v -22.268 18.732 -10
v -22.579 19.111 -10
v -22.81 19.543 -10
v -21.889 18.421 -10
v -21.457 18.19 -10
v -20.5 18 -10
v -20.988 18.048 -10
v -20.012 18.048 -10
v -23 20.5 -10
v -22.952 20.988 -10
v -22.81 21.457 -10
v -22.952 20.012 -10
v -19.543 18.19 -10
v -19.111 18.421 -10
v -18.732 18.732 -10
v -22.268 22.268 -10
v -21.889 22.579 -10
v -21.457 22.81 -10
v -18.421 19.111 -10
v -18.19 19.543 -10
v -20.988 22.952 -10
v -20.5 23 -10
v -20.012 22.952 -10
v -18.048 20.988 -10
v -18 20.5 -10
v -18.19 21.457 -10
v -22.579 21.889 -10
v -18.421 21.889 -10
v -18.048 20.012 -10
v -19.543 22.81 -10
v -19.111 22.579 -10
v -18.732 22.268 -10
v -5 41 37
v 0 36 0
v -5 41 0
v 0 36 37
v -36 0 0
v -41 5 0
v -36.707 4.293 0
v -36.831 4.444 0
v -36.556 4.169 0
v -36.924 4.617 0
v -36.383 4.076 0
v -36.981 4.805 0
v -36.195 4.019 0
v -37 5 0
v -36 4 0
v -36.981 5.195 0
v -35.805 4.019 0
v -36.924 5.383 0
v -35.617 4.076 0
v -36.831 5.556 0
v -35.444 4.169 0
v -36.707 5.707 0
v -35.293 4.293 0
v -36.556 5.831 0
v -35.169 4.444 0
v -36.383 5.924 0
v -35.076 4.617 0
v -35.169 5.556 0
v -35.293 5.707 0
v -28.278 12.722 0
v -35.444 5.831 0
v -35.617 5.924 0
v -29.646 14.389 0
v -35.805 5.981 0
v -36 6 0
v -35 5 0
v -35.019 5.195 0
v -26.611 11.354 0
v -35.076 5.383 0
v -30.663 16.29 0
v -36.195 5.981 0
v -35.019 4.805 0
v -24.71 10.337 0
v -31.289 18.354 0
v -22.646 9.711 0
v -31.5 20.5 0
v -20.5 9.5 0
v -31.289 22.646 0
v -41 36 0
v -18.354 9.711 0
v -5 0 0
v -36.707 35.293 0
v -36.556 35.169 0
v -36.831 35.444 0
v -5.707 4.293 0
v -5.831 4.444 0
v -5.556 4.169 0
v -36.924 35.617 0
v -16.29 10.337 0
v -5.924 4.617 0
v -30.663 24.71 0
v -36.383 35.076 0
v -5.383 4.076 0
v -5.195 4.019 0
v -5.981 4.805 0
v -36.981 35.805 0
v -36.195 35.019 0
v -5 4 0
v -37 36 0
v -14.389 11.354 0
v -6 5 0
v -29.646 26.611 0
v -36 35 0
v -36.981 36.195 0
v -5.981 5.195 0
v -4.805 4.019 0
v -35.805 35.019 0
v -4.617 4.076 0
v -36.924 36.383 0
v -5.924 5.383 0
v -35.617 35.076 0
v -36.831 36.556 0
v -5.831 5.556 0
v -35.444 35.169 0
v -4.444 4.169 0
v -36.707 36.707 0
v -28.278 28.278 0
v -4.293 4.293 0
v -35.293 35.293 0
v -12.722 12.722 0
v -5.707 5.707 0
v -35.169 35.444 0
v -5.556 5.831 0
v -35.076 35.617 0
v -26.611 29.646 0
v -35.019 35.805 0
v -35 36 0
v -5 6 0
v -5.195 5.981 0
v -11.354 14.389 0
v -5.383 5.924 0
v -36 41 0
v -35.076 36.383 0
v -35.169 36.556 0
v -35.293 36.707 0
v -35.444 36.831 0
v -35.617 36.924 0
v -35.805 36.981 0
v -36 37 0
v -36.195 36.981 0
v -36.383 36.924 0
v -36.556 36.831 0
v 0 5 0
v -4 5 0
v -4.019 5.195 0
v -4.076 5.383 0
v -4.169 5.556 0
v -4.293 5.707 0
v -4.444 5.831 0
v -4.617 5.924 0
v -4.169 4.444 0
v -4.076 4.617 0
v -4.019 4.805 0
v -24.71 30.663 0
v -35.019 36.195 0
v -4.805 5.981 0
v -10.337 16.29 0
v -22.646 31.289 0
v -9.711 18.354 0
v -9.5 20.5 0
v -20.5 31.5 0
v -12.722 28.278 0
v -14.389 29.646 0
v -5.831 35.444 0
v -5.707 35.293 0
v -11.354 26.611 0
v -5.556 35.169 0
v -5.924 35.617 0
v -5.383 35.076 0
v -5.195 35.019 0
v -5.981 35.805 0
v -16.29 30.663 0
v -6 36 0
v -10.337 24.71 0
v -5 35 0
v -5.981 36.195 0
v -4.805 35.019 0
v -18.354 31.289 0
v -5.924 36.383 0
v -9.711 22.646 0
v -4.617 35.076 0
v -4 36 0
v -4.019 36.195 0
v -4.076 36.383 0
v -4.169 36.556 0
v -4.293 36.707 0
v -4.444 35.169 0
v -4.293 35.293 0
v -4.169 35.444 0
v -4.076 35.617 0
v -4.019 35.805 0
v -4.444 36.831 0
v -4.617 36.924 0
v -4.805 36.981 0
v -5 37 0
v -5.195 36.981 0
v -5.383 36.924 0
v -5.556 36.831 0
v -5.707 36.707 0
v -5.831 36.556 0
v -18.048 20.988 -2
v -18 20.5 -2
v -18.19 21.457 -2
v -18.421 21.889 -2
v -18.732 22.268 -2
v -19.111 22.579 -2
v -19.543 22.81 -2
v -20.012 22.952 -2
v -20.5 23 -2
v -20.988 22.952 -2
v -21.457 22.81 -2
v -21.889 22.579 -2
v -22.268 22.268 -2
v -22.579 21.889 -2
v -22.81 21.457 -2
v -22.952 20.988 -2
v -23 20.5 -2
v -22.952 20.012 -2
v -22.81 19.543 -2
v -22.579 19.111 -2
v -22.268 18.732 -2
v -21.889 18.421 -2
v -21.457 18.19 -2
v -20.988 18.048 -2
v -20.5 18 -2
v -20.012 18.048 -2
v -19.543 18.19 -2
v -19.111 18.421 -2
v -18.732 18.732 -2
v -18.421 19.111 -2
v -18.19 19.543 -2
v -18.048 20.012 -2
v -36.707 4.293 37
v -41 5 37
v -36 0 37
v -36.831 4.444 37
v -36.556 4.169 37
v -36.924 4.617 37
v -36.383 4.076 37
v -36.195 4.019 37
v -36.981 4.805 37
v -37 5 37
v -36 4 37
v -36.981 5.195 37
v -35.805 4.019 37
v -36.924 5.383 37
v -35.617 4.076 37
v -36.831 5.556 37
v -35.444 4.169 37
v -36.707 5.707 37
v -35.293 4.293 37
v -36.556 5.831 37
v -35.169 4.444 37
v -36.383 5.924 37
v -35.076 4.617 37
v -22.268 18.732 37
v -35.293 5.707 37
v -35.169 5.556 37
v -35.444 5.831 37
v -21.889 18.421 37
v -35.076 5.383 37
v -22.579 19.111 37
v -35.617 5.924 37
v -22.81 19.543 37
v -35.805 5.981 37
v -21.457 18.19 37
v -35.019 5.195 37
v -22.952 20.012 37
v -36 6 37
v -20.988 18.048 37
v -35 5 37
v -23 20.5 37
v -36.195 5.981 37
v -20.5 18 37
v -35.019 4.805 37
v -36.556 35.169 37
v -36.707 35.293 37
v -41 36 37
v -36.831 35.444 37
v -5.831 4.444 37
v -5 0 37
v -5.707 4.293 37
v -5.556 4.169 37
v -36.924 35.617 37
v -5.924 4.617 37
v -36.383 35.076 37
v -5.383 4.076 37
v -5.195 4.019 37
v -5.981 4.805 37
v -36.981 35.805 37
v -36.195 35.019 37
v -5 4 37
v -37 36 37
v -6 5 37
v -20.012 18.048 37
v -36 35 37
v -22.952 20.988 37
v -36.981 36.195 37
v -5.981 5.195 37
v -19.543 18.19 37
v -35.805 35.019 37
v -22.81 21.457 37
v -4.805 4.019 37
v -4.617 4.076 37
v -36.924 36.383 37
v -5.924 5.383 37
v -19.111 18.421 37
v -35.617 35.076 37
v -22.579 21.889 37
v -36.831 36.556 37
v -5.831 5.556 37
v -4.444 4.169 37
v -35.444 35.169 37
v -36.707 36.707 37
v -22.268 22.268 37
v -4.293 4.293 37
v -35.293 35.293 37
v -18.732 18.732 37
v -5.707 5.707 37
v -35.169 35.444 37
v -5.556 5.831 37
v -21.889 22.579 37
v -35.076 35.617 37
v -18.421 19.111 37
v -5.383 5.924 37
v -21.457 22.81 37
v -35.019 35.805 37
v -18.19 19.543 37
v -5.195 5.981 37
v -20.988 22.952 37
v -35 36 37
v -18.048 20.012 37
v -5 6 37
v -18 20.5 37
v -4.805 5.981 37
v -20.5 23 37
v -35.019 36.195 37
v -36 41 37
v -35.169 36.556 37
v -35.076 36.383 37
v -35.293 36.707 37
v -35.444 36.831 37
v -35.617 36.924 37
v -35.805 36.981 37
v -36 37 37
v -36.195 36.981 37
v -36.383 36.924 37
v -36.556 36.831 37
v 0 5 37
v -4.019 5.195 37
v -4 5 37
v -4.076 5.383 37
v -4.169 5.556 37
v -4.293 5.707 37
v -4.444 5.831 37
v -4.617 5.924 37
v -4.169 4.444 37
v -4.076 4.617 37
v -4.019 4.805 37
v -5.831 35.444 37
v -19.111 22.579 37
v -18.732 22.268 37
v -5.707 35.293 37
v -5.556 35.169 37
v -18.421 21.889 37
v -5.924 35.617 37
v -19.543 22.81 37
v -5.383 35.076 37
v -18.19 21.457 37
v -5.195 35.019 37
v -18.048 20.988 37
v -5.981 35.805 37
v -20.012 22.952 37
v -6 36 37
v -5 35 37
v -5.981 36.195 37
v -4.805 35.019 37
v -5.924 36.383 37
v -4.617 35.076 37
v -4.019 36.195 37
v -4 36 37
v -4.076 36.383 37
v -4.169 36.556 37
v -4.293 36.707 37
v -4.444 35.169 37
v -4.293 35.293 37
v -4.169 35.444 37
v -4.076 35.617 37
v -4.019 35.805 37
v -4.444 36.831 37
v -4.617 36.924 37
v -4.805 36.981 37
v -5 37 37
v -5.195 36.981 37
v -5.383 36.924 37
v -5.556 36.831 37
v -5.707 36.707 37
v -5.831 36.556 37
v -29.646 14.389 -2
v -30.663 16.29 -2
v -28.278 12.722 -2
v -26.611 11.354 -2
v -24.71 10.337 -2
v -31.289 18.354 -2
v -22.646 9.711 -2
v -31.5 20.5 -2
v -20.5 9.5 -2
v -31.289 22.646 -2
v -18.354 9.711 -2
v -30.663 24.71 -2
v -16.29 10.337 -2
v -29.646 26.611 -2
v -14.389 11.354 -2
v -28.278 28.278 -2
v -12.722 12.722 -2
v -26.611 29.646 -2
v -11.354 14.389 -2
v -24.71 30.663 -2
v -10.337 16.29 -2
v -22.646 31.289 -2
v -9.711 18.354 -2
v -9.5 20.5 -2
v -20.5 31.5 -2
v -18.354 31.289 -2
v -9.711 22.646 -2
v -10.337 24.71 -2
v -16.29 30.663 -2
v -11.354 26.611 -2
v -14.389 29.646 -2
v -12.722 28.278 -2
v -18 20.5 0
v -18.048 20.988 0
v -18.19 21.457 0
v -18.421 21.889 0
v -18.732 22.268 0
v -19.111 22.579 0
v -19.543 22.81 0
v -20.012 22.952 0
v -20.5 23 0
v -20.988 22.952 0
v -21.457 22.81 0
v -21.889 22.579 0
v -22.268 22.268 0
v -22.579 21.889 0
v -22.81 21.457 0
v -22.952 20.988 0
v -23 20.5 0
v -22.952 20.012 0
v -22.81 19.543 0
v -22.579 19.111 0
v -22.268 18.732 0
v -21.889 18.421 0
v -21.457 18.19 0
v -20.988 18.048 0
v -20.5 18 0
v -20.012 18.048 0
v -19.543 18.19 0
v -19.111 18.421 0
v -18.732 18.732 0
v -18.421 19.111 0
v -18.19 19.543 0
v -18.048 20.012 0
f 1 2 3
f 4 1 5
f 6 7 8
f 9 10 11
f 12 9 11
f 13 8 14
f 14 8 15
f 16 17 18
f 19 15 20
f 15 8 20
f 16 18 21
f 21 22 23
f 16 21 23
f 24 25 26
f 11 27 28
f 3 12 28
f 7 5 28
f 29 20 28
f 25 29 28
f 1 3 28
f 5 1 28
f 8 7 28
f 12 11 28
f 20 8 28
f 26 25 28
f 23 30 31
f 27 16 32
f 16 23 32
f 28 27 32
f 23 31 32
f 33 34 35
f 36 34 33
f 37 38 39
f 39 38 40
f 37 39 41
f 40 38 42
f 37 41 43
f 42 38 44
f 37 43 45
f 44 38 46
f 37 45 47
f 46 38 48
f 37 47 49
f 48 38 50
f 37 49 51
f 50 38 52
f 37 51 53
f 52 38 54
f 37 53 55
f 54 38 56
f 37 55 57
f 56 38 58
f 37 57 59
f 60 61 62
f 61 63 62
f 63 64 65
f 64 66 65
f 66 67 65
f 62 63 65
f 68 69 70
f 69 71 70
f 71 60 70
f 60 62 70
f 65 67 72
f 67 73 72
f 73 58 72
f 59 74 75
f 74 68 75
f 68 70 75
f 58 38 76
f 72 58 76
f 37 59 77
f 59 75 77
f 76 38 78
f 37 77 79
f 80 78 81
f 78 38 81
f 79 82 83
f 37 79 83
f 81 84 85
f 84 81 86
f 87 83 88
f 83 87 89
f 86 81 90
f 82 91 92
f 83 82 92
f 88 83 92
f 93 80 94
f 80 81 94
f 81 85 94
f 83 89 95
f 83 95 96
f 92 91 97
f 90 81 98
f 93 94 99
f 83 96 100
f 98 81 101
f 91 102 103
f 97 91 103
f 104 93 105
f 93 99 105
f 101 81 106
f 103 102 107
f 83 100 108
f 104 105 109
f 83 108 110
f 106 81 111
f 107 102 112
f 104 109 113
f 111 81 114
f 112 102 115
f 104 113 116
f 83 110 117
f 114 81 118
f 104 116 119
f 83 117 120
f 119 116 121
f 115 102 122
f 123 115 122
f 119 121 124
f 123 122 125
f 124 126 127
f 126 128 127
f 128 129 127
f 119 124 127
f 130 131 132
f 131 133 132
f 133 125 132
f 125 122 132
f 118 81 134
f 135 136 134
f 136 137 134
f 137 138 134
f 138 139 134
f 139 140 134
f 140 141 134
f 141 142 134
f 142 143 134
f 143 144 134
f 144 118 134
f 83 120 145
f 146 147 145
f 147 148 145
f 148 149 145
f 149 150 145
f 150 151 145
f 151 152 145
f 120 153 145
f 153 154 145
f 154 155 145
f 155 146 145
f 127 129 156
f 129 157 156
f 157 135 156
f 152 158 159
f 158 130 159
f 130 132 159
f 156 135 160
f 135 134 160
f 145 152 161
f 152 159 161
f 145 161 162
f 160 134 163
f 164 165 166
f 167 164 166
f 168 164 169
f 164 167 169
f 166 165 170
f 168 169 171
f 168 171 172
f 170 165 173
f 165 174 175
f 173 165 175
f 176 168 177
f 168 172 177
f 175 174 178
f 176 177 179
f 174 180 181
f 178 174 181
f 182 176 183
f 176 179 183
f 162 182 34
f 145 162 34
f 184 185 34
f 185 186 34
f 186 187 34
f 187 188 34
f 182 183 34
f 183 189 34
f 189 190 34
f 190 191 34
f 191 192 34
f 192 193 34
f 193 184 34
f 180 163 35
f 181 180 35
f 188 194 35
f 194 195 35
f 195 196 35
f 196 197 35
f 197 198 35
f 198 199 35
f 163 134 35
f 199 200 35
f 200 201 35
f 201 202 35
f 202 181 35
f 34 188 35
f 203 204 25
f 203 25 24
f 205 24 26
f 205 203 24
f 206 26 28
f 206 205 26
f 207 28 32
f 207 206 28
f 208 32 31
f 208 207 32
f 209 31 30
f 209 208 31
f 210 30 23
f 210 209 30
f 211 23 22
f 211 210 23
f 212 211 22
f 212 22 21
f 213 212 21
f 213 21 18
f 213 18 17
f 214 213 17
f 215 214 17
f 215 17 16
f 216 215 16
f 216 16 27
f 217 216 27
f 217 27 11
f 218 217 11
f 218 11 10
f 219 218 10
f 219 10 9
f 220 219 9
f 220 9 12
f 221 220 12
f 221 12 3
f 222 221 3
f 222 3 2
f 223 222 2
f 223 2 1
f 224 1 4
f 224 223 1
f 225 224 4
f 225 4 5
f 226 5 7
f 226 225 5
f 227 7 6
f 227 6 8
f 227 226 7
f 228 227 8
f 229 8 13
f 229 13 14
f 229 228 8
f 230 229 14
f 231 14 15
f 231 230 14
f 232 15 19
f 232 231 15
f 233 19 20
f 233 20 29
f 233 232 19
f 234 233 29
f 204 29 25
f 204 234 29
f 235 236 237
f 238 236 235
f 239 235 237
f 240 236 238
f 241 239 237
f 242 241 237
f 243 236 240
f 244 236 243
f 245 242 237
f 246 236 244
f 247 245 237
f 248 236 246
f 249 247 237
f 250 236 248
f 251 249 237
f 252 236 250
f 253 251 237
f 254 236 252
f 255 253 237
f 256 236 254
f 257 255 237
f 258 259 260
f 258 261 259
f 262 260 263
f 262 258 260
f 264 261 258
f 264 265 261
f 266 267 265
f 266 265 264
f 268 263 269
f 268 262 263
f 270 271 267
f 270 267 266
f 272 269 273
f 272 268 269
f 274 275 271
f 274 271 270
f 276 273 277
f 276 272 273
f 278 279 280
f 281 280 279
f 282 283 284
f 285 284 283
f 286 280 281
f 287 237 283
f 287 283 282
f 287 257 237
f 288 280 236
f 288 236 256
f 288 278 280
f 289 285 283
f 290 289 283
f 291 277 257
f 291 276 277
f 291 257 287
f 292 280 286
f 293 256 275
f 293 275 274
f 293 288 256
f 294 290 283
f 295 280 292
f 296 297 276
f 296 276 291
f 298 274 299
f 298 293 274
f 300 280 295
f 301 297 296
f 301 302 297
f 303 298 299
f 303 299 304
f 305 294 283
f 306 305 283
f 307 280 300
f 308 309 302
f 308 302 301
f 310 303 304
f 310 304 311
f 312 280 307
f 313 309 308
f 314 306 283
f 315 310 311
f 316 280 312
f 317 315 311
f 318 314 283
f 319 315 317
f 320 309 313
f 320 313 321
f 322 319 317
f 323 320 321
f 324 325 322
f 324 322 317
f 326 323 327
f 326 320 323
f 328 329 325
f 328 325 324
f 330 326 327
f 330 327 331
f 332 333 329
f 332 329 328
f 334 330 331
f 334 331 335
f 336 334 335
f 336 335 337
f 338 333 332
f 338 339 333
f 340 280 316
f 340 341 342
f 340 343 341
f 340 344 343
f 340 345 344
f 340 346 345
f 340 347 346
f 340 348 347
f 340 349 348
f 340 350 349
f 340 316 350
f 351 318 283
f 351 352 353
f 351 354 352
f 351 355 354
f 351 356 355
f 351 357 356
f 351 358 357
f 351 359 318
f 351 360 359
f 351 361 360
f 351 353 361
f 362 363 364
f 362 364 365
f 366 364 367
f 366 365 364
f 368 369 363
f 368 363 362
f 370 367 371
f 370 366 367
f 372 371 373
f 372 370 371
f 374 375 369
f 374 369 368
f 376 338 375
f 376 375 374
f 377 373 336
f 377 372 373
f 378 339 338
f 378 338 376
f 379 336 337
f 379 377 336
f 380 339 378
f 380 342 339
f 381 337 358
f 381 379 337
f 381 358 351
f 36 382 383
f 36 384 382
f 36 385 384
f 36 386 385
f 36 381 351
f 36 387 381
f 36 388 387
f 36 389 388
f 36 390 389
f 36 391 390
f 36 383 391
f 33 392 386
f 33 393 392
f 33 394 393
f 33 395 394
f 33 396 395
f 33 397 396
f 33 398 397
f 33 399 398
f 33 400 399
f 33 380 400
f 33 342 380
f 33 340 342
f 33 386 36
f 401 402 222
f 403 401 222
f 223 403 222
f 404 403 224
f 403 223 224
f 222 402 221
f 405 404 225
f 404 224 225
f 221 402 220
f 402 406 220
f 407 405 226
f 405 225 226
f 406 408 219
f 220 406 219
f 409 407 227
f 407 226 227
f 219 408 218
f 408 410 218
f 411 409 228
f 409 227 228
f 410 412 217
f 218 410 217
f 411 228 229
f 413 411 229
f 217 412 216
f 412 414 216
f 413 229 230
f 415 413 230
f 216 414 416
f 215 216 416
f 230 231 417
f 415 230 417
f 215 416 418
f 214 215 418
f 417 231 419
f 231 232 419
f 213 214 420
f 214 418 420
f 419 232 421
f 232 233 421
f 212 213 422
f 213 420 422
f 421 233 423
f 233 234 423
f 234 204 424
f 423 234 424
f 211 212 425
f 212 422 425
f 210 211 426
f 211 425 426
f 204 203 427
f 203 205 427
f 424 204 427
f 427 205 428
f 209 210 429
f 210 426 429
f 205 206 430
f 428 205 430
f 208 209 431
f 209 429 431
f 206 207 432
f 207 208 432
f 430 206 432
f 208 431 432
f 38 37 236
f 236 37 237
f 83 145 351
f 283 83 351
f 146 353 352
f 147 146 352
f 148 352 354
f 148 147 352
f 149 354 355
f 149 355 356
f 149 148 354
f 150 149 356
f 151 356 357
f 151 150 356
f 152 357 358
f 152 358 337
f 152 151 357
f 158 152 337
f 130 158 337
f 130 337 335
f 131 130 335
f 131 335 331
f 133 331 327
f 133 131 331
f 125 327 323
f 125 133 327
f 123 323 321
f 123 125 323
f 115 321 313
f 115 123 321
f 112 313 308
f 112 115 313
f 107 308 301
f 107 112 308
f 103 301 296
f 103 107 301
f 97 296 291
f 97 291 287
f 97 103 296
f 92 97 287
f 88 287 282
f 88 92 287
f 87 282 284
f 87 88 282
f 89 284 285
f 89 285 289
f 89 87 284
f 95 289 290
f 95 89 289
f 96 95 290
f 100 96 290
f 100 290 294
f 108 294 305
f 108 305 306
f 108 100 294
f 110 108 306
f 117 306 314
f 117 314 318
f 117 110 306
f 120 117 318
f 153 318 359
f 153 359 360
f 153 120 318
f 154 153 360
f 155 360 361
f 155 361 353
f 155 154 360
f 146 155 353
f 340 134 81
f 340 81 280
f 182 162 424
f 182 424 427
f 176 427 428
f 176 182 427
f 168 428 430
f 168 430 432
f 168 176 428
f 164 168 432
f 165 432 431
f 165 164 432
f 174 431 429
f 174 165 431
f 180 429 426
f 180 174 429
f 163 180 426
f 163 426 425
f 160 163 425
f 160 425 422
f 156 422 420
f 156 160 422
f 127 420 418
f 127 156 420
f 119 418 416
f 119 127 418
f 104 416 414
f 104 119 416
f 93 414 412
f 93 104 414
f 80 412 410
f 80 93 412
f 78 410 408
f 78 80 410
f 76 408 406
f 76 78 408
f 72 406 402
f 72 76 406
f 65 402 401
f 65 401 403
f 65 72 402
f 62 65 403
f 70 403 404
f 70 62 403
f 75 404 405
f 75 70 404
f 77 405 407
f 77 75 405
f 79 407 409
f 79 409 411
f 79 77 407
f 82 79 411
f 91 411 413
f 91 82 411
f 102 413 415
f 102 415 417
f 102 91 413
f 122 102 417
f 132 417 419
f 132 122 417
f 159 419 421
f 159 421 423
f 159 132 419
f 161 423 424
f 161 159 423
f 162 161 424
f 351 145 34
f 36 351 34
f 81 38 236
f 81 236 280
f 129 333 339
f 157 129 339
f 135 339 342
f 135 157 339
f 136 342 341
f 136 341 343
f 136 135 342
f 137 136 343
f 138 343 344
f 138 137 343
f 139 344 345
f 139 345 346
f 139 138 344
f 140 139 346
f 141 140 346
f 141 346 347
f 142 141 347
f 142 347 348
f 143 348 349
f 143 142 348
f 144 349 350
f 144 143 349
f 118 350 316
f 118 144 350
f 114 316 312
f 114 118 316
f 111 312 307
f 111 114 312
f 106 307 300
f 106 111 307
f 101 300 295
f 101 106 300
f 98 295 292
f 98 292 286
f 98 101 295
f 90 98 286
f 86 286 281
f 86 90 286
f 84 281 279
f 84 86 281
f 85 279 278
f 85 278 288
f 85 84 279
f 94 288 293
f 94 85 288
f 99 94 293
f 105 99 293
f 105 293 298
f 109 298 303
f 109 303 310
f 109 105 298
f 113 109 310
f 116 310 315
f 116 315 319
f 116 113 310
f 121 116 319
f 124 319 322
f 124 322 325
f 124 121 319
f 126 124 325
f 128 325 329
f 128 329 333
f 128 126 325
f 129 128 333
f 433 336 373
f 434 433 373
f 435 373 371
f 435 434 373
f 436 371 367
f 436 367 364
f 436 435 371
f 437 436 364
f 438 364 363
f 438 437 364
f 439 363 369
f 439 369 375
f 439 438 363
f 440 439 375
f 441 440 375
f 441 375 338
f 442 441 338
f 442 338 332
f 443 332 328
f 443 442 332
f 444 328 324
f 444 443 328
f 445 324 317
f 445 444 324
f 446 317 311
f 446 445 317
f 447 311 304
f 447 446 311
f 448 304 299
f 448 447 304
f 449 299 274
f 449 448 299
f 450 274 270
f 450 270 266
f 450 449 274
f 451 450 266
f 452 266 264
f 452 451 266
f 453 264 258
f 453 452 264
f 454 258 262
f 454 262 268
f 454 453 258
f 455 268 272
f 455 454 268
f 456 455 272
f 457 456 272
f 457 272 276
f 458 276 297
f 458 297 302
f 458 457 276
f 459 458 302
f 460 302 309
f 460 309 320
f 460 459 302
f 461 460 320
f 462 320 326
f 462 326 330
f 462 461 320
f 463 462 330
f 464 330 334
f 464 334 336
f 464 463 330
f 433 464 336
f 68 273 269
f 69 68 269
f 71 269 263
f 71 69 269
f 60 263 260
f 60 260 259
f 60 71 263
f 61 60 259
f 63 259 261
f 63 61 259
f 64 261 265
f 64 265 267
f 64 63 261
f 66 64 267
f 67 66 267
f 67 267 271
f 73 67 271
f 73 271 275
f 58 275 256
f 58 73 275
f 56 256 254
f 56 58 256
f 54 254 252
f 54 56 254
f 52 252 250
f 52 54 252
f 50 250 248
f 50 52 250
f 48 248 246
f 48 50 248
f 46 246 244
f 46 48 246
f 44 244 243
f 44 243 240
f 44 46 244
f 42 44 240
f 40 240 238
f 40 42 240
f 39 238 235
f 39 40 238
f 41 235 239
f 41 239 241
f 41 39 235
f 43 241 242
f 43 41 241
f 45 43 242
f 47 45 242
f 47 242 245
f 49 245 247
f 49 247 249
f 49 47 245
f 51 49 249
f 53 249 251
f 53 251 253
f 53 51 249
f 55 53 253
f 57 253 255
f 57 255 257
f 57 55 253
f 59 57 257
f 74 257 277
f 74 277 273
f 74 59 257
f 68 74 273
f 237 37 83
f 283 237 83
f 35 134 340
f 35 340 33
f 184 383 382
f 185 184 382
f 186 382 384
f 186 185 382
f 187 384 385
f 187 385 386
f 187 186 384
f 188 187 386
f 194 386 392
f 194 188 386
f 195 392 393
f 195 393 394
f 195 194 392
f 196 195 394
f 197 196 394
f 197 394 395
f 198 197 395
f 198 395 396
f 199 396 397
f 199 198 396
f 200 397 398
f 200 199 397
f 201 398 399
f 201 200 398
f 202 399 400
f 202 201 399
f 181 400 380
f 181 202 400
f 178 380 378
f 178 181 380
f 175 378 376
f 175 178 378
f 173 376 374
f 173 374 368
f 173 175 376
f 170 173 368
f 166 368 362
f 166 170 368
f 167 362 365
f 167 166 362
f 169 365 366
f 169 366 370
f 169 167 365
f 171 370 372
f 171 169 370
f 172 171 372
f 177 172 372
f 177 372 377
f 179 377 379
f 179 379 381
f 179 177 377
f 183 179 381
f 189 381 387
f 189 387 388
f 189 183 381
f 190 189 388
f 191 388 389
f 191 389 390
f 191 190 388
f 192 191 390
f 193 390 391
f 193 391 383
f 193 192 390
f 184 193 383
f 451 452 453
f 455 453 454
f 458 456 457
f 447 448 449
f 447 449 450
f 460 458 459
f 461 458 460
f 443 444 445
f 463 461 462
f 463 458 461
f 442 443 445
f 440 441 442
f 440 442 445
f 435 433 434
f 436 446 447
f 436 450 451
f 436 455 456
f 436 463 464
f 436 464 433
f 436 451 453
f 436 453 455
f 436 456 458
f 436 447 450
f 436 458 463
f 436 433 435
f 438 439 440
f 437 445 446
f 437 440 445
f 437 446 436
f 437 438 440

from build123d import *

# Parameters (mm, degrees)
F0_W     = 41
F0_H     = 41
F0_R     = 1
F0_R_2   = 11
F0_R_3   = 2.5
F1_DEPTH = 37
F2_SIZE  = 5
F3_DEPTH = 2
F4_DEPTH = 10


with BuildPart() as f1:
    # F0 (on Top) → F1 (new body)
    with BuildSketch(Plane.XY):
        with Locations((-20.5, 20.5)):
            Rectangle(F0_W, F0_H)
        with Locations((-36, 5)):
            Circle(F0_R, mode=Mode.SUBTRACT)
        with Locations((-5, 5)):
            Circle(F0_R, mode=Mode.SUBTRACT)
        with Locations((-36, 36)):
            Circle(F0_R, mode=Mode.SUBTRACT)
        with Locations((-20.5, 20.5)):
            Circle(F0_R_2, mode=Mode.SUBTRACT)
        with Locations((-5, 36)):
            Circle(F0_R, mode=Mode.SUBTRACT)
        with Locations((-20.5, 20.5)):
            Circle(F0_R_2)
        with Locations((-20.5, 20.5)):
            Circle(F0_R_3, mode=Mode.SUBTRACT)
    extrude(amount=F1_DEPTH)

    # F2
    f2_edges = [f1.edges().sort_by_distance(p)[0] for p in [
        (0, 41, 18.5),
        (-41, 41, 18.5),
        (0, 0, 18.5),
        (-41, 0, 18.5),
    ]]
    chamfer(f2_edges, length=F2_SIZE)

    # F0 (on Top) → F3 (join)
    with BuildSketch(Plane.XY):
        with Locations((-20.5, 20.5)):
            Circle(F0_R_2)
        with Locations((-20.5, 20.5)):
            Circle(F0_R_3, mode=Mode.SUBTRACT)
    extrude(amount=-F3_DEPTH)

    # F0 (on Top) → F4 (join)
    with BuildSketch(Plane.XY):
        with Locations((-20.5, 20.5)):
            Circle(F0_R_3)
    extrude(amount=-F4_DEPTH)


solid = f1.part
